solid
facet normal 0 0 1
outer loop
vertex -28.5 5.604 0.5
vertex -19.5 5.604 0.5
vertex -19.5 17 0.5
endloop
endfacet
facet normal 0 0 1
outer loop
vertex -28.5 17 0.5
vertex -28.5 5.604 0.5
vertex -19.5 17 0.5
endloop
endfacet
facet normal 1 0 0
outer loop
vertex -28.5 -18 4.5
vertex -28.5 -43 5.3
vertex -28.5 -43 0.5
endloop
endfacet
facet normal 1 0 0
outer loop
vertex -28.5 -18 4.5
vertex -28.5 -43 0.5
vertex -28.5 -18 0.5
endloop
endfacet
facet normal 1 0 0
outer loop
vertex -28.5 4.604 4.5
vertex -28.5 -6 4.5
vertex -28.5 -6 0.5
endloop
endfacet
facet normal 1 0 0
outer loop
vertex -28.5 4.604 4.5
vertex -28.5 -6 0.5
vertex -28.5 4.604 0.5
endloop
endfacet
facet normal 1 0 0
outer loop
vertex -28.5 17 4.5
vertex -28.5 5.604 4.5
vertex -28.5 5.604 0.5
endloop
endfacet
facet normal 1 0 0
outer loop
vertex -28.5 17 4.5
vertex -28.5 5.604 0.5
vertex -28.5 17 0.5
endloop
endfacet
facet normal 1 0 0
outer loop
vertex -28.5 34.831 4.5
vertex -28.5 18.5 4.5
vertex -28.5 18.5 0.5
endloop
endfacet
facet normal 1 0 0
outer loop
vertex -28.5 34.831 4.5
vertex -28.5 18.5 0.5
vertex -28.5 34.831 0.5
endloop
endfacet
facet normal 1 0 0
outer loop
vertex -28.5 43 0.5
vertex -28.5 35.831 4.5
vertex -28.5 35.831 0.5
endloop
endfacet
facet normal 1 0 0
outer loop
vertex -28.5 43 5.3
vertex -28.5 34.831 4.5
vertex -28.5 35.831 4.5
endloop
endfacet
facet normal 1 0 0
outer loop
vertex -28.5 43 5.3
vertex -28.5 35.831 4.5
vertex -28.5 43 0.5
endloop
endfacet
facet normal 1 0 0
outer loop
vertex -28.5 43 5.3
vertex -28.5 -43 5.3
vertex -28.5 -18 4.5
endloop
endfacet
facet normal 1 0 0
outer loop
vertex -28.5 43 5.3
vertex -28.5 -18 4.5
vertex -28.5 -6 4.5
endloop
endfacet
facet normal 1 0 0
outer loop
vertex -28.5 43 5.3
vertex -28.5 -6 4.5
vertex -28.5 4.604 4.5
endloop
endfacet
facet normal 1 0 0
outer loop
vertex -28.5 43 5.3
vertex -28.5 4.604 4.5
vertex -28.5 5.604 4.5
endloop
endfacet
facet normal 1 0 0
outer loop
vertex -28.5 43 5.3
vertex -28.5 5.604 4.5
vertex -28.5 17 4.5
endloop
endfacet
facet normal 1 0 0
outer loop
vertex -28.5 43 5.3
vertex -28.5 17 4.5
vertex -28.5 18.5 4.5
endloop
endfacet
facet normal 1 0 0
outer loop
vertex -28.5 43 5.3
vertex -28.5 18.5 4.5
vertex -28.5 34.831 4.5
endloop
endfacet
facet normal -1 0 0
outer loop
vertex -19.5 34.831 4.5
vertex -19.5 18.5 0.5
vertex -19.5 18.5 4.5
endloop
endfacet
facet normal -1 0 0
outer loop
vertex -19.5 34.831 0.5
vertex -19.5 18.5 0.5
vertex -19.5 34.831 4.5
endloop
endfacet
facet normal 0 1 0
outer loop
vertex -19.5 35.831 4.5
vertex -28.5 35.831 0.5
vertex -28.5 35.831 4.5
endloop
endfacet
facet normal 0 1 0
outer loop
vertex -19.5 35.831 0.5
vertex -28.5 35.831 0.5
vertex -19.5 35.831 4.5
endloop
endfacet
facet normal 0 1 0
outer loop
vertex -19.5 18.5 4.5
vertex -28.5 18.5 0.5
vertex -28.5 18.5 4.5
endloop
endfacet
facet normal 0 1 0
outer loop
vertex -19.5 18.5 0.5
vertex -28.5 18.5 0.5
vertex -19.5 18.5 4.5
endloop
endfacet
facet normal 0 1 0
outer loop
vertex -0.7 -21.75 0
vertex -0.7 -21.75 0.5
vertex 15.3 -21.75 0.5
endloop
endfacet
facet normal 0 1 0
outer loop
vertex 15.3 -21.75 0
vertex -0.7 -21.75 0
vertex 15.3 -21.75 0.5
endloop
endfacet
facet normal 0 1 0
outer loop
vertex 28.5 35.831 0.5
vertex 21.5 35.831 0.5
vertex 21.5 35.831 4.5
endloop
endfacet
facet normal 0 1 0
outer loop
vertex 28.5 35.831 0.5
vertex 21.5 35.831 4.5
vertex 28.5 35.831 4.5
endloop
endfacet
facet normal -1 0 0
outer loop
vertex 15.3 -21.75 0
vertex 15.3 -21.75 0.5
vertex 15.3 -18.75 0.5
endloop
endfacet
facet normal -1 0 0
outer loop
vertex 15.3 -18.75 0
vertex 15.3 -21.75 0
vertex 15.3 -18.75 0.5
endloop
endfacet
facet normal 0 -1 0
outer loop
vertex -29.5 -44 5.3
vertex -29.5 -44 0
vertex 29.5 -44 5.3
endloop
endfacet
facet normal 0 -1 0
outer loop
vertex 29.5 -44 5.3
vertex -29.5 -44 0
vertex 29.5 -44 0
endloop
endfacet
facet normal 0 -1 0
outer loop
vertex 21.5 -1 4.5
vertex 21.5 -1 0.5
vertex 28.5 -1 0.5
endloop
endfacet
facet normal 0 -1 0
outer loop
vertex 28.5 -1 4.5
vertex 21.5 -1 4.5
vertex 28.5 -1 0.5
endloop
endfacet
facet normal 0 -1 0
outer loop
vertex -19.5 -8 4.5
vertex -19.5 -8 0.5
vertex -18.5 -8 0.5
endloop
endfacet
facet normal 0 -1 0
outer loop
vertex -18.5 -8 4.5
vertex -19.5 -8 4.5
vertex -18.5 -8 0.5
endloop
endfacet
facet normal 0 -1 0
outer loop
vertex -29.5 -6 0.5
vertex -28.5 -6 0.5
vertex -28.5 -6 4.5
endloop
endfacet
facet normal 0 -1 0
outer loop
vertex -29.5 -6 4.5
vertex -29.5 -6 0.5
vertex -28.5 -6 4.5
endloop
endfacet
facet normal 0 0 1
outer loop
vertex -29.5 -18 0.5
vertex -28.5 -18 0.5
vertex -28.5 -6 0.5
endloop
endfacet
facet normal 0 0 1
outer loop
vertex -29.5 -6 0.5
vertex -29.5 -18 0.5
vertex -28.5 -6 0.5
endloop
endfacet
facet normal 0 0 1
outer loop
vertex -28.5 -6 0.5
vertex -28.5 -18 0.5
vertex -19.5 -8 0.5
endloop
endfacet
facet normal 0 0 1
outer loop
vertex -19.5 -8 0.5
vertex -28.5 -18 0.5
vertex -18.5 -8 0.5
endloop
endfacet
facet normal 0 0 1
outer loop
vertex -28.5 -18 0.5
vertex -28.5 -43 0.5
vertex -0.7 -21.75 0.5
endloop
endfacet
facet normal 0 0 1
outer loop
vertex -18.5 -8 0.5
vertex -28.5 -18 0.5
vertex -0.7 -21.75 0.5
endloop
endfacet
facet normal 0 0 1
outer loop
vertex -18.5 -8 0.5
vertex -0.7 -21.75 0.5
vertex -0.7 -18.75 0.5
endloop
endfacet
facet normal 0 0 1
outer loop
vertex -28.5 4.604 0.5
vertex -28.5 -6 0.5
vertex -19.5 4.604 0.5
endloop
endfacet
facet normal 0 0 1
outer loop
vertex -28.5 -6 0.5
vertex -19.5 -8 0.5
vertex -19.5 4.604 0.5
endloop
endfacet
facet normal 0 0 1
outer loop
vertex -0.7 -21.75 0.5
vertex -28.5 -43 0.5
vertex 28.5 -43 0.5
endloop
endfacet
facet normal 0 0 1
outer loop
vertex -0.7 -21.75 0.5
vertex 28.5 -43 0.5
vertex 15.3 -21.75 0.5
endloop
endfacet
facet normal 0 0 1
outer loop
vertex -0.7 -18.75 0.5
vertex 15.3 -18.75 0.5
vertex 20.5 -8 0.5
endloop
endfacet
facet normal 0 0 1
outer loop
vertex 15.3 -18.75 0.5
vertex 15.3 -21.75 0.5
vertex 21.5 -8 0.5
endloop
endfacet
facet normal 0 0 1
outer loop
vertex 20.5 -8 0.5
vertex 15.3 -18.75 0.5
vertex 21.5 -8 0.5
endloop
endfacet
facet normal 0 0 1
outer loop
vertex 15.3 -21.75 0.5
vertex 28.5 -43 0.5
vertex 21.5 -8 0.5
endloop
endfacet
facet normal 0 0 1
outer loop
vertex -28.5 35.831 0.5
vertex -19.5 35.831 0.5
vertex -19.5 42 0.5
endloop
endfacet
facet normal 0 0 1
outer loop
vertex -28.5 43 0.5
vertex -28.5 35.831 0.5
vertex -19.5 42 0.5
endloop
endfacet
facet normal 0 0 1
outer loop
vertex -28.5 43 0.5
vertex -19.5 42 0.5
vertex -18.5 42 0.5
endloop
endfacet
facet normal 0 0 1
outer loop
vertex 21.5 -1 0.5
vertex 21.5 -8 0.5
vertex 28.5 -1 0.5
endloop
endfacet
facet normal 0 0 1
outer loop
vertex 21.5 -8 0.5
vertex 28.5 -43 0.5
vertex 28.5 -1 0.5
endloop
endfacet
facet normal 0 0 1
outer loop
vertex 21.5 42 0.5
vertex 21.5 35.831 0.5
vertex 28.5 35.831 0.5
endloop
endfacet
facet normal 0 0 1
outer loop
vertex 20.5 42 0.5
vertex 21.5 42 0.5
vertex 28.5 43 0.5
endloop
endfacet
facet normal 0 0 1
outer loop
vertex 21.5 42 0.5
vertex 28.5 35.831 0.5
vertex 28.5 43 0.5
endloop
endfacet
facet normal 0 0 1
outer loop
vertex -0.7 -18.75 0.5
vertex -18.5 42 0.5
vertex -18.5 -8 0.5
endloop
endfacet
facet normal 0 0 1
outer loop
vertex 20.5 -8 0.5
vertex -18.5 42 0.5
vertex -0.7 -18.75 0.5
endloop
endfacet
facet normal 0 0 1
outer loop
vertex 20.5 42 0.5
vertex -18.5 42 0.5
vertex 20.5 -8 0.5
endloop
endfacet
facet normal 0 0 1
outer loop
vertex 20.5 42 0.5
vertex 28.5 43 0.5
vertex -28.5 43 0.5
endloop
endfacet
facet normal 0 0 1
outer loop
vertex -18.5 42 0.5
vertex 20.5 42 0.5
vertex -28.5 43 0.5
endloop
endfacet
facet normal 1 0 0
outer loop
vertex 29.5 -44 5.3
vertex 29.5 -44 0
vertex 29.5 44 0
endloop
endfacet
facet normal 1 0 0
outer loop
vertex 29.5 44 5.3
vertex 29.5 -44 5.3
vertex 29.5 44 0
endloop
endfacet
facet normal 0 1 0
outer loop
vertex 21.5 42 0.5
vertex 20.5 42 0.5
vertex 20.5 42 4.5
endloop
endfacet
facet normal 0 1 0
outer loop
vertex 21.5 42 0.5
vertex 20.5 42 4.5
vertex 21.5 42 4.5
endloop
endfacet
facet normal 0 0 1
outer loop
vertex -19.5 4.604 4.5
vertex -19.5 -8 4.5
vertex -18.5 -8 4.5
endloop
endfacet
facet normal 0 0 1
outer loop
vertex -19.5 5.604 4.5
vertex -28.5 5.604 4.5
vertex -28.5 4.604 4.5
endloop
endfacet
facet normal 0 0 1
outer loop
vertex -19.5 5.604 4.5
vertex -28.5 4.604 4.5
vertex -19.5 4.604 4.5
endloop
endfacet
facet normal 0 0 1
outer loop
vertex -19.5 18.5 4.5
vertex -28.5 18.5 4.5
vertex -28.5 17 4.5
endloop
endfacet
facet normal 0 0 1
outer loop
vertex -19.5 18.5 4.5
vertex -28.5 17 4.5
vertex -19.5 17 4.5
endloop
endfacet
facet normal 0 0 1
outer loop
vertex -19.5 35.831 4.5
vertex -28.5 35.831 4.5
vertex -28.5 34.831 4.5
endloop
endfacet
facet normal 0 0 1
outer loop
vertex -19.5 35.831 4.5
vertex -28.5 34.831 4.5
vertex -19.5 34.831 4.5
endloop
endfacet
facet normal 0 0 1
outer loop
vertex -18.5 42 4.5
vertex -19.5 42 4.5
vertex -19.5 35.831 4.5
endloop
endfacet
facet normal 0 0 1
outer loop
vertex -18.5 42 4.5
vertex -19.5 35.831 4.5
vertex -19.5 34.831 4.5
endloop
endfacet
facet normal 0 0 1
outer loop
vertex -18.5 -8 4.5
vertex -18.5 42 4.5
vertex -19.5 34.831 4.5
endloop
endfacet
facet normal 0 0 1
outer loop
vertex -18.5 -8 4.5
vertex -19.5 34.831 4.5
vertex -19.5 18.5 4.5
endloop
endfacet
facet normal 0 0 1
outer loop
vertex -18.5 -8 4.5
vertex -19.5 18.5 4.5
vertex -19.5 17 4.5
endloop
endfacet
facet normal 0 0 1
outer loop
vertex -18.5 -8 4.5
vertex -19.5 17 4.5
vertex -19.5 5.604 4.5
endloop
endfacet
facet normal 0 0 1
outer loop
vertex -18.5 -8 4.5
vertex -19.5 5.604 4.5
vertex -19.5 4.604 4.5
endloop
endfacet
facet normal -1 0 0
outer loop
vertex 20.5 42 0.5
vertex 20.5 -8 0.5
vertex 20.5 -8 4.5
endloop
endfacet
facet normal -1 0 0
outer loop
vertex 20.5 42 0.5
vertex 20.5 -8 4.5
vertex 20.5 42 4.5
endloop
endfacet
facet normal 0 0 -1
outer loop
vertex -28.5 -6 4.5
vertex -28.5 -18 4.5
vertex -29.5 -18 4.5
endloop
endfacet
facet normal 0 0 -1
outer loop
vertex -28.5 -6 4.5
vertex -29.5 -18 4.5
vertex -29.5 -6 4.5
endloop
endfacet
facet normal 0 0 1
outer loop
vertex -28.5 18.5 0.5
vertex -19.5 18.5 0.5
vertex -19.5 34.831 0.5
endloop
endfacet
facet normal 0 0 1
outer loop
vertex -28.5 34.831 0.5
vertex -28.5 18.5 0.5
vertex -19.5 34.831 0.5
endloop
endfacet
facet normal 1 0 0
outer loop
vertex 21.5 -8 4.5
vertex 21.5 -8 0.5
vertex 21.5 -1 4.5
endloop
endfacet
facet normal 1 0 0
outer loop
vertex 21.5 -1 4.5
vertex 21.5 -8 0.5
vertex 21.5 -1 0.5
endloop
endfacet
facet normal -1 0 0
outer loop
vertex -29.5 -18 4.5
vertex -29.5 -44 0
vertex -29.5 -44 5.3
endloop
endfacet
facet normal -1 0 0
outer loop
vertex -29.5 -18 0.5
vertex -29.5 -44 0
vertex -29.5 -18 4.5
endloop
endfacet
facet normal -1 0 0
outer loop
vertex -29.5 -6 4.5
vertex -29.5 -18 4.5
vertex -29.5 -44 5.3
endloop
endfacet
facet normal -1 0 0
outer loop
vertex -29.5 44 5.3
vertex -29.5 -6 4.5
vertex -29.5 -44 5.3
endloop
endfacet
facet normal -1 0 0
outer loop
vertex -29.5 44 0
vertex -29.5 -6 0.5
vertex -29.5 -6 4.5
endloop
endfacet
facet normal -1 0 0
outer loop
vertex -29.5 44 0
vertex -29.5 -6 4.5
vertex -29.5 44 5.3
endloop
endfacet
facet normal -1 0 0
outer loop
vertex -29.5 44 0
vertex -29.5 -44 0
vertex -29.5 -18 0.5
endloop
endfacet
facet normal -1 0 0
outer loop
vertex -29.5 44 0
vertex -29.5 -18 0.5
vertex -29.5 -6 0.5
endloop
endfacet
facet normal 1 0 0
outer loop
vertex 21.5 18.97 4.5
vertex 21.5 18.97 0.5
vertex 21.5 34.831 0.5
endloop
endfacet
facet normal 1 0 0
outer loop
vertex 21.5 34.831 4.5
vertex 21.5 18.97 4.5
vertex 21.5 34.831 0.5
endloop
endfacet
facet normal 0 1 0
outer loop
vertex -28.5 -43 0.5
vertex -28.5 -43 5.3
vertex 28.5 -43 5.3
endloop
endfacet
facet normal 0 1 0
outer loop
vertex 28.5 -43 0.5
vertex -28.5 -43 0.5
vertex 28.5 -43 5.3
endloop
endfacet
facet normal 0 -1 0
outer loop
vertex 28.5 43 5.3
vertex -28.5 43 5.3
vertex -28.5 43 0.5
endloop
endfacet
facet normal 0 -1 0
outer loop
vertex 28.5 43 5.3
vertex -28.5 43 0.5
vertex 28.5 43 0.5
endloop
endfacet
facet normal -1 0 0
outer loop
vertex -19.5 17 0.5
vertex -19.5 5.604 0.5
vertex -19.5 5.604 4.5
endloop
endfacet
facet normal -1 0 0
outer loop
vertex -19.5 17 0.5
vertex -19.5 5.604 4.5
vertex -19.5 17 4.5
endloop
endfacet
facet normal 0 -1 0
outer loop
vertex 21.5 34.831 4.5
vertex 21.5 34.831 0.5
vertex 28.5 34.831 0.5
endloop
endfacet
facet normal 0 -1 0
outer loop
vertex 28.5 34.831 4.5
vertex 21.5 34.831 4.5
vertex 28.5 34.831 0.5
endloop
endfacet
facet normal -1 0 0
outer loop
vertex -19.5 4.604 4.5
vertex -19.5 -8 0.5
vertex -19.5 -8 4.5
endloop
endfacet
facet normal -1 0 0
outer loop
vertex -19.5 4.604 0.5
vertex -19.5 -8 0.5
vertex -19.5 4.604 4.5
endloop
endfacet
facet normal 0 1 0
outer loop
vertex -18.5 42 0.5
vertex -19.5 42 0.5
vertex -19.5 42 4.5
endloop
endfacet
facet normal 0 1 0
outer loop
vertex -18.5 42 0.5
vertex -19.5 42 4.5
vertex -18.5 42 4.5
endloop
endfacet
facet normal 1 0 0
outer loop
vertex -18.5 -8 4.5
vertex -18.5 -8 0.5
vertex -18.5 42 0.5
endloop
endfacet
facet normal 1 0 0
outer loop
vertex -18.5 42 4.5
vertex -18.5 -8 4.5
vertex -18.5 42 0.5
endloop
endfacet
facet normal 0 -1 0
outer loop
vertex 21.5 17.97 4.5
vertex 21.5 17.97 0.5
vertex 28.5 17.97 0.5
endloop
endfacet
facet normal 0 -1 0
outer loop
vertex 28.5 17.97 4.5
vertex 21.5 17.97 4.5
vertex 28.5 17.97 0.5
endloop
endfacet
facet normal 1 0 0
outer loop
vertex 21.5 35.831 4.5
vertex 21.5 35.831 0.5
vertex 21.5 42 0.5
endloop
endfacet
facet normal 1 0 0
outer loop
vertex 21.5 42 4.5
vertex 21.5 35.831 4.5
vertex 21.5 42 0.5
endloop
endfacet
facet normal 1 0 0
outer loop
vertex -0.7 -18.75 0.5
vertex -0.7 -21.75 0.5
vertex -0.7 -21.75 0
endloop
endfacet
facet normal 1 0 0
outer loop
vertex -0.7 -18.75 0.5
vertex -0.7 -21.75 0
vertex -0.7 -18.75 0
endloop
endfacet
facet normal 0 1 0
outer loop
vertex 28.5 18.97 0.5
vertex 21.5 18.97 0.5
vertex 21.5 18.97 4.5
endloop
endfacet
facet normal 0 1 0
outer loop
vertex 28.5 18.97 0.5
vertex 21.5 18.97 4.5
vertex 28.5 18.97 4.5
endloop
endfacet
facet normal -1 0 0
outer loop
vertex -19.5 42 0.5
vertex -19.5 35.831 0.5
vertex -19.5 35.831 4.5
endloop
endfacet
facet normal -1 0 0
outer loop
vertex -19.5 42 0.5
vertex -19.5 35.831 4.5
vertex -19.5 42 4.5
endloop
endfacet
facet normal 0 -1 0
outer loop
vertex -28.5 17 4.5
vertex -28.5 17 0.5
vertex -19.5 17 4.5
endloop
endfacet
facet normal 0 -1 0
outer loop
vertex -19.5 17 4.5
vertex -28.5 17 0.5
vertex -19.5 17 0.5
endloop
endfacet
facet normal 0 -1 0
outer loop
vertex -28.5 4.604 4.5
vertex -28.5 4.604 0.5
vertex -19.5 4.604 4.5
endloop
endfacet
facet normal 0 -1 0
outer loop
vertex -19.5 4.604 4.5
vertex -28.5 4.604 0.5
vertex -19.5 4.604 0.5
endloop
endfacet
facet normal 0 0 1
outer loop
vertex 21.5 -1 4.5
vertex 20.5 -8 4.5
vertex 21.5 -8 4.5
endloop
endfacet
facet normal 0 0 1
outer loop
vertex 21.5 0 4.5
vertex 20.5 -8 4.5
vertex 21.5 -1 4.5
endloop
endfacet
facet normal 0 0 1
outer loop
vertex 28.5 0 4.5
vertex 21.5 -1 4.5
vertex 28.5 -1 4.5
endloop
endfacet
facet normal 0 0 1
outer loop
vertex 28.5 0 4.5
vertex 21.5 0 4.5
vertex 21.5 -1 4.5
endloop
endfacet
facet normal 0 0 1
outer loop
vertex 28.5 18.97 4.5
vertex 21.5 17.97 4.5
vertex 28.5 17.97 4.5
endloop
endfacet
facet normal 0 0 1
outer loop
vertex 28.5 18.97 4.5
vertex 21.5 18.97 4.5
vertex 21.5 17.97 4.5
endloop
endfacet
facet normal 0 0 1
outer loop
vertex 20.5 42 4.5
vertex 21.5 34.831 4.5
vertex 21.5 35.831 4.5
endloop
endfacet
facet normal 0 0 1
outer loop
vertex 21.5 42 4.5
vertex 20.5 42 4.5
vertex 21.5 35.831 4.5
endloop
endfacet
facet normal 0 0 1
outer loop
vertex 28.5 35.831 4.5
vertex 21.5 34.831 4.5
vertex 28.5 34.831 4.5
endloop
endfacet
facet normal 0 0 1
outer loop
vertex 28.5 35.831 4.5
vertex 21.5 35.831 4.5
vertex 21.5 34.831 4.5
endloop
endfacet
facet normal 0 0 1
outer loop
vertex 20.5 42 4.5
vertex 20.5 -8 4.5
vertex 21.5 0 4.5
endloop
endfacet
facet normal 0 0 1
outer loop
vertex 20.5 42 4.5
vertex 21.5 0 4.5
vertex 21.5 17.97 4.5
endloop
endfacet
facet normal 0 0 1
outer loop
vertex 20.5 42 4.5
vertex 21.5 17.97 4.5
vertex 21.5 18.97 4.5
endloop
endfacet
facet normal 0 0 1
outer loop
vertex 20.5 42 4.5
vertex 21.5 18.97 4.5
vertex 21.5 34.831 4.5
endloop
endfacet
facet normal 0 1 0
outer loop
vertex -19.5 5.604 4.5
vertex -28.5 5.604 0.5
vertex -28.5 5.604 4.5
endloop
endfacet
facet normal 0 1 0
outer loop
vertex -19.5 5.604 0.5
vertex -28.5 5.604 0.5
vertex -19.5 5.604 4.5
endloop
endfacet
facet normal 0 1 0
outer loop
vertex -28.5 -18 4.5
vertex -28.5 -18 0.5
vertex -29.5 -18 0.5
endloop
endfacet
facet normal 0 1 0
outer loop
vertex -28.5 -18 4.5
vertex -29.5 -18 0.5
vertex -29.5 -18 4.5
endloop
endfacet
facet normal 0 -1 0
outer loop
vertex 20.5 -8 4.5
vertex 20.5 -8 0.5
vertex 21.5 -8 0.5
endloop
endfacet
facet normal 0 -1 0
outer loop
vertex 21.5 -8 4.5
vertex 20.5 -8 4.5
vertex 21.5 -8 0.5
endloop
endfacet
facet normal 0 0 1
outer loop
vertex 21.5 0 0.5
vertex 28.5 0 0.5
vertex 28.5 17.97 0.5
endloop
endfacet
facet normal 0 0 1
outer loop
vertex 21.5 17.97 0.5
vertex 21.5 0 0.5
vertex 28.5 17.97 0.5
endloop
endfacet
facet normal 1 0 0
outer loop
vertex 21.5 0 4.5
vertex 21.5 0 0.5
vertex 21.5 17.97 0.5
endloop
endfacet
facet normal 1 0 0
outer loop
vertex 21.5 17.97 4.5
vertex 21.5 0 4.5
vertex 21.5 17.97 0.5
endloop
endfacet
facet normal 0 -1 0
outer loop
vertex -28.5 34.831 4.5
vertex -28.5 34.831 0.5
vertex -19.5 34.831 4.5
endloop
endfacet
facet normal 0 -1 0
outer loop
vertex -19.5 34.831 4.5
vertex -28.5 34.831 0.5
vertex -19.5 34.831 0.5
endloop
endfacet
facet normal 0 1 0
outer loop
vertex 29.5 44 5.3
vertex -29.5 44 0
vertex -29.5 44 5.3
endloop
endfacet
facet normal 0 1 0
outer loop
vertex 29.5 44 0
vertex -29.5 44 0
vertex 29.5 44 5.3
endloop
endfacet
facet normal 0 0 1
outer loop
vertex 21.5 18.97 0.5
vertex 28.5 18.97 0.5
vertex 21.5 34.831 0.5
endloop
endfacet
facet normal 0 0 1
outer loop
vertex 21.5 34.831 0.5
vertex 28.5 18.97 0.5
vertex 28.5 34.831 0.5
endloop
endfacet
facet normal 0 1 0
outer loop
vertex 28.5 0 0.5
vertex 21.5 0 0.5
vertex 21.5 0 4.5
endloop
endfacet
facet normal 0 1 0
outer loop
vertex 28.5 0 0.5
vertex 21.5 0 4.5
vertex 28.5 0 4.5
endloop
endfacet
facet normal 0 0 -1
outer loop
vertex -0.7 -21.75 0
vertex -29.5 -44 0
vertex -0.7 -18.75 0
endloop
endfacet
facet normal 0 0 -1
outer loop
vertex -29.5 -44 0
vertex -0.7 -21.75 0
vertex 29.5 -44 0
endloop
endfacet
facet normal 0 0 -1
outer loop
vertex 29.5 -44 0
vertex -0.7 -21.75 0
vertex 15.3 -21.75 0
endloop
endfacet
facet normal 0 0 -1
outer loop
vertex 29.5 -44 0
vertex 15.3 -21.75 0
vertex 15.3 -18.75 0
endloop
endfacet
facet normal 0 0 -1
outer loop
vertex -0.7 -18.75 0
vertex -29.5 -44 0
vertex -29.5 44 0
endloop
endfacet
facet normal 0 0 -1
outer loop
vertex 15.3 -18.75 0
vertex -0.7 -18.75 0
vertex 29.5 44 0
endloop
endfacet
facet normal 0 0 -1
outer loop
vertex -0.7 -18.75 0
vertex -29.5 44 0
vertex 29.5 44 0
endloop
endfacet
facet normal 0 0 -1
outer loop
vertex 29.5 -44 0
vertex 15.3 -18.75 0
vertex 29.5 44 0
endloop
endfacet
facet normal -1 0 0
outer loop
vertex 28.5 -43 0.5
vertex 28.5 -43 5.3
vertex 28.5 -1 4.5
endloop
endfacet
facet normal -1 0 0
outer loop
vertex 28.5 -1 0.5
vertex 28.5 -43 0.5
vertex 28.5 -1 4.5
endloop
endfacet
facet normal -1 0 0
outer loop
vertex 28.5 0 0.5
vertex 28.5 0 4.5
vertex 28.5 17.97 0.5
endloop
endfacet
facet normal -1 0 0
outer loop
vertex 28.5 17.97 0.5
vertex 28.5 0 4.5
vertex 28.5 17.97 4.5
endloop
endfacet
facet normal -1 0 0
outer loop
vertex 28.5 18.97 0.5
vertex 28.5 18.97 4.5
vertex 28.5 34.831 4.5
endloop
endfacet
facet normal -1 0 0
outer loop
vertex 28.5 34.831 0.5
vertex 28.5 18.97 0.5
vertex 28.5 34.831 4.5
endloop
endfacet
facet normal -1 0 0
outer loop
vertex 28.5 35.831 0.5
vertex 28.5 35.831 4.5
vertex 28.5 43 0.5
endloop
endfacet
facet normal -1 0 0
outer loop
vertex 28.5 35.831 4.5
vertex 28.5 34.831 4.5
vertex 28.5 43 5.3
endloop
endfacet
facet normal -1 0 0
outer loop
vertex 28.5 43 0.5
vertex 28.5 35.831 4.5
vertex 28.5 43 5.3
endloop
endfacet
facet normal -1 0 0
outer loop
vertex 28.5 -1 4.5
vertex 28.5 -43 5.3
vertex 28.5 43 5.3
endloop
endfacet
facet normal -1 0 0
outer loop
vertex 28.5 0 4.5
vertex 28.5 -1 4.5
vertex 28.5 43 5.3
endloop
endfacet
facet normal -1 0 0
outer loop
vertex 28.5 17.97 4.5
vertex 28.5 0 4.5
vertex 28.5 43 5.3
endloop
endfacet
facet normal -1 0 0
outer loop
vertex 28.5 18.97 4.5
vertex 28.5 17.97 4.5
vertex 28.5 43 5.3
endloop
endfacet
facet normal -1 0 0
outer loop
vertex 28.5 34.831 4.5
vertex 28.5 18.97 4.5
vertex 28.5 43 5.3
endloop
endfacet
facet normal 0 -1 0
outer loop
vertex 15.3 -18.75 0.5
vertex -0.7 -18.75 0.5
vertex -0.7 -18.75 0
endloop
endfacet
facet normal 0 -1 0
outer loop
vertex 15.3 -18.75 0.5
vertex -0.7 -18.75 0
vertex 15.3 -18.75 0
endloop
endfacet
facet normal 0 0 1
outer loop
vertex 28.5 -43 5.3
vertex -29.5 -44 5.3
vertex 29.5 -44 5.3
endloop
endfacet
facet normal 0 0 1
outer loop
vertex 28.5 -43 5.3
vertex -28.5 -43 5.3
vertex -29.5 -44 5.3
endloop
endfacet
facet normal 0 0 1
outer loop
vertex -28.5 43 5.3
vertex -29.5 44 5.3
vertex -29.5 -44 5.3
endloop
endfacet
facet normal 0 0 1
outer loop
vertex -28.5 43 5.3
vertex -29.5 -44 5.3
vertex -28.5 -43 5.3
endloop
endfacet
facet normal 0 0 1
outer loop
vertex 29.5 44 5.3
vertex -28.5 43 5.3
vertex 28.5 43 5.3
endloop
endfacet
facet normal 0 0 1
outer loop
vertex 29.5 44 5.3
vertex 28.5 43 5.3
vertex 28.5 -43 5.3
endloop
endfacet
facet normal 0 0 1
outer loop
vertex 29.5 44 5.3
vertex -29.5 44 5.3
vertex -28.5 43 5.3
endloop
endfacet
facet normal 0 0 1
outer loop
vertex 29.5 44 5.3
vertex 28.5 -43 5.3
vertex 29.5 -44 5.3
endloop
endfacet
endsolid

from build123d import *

# Parameters (mm, degrees)
F0_W      = 59
F0_H      = 88
F1_DEPTH  = 5.3
F2_W      = 57
F2_H      = 86
F3_DEPTH  = 4.8
F4_W      = 12
F4_H      = 4
F5_DEPTH  = 2
F6_W      = 1
F6_H      = 50
F7_DEPTH  = 4
F8_W      = 9
F8_H      = 1
F8_W_2    = 7
F8_H_2    = 1.5
F9_DEPTH  = 4
F10_W     = 16
F10_H     = 3
F11_DEPTH = 1


with BuildPart() as f1:
    # F0 (on Top) → F1 (new body)
    with BuildSketch(Plane.XY):
        Rectangle(F0_W, F0_H)
    extrude(amount=F1_DEPTH)

    # F2 (on face) → F3 (cut)
    with BuildSketch(Plane.XY.offset(5.3)):
        Rectangle(F2_W, F2_H)
    extrude(amount=-F3_DEPTH, mode=Mode.SUBTRACT)

    # F4 (on face) → F5 (cut)
    with BuildSketch(Plane.YZ.offset(-28.5)):
        with Locations((-12, 2.5)):
            Rectangle(F4_W, F4_H)
    extrude(amount=-F5_DEPTH, mode=Mode.SUBTRACT)

    # F6 (on face) → F7 (join)
    with BuildSketch(Plane.XY.offset(0.5)):
        with Locations((-19, 17)):
            Rectangle(F6_W, F6_H)
        with Locations((21, 17)):
            Rectangle(F6_W, F6_H)
    extrude(amount=F7_DEPTH)

    # F8 (on face) → F9 (join)
    with BuildSketch(Plane.XY.offset(0.5)):
        with Locations((-24, 35.330578)):
            Rectangle(F8_W, F8_H)
        with Locations((-24, 5.103508)):
            Rectangle(F8_W, F8_H)
        with Locations((25, 35.330578)):
            Rectangle(F8_W_2, F8_H)
        with Locations((25, 18.469588)):
            Rectangle(F8_W_2, F8_H)
        with Locations((25, -0.5)):
            Rectangle(F8_W_2, F8_H)
        with Locations((-24, 17.75)):
            Rectangle(F8_W, F8_H_2)
    extrude(amount=F9_DEPTH)

    # F10 (on face) → F11 (cut)
    with BuildSketch(Plane.XY.offset(0.5)):
        with Locations((7.3, -20.25)):
            Rectangle(F10_W, F10_H)
    extrude(amount=-F11_DEPTH, mode=Mode.SUBTRACT)


solid = f1.part
